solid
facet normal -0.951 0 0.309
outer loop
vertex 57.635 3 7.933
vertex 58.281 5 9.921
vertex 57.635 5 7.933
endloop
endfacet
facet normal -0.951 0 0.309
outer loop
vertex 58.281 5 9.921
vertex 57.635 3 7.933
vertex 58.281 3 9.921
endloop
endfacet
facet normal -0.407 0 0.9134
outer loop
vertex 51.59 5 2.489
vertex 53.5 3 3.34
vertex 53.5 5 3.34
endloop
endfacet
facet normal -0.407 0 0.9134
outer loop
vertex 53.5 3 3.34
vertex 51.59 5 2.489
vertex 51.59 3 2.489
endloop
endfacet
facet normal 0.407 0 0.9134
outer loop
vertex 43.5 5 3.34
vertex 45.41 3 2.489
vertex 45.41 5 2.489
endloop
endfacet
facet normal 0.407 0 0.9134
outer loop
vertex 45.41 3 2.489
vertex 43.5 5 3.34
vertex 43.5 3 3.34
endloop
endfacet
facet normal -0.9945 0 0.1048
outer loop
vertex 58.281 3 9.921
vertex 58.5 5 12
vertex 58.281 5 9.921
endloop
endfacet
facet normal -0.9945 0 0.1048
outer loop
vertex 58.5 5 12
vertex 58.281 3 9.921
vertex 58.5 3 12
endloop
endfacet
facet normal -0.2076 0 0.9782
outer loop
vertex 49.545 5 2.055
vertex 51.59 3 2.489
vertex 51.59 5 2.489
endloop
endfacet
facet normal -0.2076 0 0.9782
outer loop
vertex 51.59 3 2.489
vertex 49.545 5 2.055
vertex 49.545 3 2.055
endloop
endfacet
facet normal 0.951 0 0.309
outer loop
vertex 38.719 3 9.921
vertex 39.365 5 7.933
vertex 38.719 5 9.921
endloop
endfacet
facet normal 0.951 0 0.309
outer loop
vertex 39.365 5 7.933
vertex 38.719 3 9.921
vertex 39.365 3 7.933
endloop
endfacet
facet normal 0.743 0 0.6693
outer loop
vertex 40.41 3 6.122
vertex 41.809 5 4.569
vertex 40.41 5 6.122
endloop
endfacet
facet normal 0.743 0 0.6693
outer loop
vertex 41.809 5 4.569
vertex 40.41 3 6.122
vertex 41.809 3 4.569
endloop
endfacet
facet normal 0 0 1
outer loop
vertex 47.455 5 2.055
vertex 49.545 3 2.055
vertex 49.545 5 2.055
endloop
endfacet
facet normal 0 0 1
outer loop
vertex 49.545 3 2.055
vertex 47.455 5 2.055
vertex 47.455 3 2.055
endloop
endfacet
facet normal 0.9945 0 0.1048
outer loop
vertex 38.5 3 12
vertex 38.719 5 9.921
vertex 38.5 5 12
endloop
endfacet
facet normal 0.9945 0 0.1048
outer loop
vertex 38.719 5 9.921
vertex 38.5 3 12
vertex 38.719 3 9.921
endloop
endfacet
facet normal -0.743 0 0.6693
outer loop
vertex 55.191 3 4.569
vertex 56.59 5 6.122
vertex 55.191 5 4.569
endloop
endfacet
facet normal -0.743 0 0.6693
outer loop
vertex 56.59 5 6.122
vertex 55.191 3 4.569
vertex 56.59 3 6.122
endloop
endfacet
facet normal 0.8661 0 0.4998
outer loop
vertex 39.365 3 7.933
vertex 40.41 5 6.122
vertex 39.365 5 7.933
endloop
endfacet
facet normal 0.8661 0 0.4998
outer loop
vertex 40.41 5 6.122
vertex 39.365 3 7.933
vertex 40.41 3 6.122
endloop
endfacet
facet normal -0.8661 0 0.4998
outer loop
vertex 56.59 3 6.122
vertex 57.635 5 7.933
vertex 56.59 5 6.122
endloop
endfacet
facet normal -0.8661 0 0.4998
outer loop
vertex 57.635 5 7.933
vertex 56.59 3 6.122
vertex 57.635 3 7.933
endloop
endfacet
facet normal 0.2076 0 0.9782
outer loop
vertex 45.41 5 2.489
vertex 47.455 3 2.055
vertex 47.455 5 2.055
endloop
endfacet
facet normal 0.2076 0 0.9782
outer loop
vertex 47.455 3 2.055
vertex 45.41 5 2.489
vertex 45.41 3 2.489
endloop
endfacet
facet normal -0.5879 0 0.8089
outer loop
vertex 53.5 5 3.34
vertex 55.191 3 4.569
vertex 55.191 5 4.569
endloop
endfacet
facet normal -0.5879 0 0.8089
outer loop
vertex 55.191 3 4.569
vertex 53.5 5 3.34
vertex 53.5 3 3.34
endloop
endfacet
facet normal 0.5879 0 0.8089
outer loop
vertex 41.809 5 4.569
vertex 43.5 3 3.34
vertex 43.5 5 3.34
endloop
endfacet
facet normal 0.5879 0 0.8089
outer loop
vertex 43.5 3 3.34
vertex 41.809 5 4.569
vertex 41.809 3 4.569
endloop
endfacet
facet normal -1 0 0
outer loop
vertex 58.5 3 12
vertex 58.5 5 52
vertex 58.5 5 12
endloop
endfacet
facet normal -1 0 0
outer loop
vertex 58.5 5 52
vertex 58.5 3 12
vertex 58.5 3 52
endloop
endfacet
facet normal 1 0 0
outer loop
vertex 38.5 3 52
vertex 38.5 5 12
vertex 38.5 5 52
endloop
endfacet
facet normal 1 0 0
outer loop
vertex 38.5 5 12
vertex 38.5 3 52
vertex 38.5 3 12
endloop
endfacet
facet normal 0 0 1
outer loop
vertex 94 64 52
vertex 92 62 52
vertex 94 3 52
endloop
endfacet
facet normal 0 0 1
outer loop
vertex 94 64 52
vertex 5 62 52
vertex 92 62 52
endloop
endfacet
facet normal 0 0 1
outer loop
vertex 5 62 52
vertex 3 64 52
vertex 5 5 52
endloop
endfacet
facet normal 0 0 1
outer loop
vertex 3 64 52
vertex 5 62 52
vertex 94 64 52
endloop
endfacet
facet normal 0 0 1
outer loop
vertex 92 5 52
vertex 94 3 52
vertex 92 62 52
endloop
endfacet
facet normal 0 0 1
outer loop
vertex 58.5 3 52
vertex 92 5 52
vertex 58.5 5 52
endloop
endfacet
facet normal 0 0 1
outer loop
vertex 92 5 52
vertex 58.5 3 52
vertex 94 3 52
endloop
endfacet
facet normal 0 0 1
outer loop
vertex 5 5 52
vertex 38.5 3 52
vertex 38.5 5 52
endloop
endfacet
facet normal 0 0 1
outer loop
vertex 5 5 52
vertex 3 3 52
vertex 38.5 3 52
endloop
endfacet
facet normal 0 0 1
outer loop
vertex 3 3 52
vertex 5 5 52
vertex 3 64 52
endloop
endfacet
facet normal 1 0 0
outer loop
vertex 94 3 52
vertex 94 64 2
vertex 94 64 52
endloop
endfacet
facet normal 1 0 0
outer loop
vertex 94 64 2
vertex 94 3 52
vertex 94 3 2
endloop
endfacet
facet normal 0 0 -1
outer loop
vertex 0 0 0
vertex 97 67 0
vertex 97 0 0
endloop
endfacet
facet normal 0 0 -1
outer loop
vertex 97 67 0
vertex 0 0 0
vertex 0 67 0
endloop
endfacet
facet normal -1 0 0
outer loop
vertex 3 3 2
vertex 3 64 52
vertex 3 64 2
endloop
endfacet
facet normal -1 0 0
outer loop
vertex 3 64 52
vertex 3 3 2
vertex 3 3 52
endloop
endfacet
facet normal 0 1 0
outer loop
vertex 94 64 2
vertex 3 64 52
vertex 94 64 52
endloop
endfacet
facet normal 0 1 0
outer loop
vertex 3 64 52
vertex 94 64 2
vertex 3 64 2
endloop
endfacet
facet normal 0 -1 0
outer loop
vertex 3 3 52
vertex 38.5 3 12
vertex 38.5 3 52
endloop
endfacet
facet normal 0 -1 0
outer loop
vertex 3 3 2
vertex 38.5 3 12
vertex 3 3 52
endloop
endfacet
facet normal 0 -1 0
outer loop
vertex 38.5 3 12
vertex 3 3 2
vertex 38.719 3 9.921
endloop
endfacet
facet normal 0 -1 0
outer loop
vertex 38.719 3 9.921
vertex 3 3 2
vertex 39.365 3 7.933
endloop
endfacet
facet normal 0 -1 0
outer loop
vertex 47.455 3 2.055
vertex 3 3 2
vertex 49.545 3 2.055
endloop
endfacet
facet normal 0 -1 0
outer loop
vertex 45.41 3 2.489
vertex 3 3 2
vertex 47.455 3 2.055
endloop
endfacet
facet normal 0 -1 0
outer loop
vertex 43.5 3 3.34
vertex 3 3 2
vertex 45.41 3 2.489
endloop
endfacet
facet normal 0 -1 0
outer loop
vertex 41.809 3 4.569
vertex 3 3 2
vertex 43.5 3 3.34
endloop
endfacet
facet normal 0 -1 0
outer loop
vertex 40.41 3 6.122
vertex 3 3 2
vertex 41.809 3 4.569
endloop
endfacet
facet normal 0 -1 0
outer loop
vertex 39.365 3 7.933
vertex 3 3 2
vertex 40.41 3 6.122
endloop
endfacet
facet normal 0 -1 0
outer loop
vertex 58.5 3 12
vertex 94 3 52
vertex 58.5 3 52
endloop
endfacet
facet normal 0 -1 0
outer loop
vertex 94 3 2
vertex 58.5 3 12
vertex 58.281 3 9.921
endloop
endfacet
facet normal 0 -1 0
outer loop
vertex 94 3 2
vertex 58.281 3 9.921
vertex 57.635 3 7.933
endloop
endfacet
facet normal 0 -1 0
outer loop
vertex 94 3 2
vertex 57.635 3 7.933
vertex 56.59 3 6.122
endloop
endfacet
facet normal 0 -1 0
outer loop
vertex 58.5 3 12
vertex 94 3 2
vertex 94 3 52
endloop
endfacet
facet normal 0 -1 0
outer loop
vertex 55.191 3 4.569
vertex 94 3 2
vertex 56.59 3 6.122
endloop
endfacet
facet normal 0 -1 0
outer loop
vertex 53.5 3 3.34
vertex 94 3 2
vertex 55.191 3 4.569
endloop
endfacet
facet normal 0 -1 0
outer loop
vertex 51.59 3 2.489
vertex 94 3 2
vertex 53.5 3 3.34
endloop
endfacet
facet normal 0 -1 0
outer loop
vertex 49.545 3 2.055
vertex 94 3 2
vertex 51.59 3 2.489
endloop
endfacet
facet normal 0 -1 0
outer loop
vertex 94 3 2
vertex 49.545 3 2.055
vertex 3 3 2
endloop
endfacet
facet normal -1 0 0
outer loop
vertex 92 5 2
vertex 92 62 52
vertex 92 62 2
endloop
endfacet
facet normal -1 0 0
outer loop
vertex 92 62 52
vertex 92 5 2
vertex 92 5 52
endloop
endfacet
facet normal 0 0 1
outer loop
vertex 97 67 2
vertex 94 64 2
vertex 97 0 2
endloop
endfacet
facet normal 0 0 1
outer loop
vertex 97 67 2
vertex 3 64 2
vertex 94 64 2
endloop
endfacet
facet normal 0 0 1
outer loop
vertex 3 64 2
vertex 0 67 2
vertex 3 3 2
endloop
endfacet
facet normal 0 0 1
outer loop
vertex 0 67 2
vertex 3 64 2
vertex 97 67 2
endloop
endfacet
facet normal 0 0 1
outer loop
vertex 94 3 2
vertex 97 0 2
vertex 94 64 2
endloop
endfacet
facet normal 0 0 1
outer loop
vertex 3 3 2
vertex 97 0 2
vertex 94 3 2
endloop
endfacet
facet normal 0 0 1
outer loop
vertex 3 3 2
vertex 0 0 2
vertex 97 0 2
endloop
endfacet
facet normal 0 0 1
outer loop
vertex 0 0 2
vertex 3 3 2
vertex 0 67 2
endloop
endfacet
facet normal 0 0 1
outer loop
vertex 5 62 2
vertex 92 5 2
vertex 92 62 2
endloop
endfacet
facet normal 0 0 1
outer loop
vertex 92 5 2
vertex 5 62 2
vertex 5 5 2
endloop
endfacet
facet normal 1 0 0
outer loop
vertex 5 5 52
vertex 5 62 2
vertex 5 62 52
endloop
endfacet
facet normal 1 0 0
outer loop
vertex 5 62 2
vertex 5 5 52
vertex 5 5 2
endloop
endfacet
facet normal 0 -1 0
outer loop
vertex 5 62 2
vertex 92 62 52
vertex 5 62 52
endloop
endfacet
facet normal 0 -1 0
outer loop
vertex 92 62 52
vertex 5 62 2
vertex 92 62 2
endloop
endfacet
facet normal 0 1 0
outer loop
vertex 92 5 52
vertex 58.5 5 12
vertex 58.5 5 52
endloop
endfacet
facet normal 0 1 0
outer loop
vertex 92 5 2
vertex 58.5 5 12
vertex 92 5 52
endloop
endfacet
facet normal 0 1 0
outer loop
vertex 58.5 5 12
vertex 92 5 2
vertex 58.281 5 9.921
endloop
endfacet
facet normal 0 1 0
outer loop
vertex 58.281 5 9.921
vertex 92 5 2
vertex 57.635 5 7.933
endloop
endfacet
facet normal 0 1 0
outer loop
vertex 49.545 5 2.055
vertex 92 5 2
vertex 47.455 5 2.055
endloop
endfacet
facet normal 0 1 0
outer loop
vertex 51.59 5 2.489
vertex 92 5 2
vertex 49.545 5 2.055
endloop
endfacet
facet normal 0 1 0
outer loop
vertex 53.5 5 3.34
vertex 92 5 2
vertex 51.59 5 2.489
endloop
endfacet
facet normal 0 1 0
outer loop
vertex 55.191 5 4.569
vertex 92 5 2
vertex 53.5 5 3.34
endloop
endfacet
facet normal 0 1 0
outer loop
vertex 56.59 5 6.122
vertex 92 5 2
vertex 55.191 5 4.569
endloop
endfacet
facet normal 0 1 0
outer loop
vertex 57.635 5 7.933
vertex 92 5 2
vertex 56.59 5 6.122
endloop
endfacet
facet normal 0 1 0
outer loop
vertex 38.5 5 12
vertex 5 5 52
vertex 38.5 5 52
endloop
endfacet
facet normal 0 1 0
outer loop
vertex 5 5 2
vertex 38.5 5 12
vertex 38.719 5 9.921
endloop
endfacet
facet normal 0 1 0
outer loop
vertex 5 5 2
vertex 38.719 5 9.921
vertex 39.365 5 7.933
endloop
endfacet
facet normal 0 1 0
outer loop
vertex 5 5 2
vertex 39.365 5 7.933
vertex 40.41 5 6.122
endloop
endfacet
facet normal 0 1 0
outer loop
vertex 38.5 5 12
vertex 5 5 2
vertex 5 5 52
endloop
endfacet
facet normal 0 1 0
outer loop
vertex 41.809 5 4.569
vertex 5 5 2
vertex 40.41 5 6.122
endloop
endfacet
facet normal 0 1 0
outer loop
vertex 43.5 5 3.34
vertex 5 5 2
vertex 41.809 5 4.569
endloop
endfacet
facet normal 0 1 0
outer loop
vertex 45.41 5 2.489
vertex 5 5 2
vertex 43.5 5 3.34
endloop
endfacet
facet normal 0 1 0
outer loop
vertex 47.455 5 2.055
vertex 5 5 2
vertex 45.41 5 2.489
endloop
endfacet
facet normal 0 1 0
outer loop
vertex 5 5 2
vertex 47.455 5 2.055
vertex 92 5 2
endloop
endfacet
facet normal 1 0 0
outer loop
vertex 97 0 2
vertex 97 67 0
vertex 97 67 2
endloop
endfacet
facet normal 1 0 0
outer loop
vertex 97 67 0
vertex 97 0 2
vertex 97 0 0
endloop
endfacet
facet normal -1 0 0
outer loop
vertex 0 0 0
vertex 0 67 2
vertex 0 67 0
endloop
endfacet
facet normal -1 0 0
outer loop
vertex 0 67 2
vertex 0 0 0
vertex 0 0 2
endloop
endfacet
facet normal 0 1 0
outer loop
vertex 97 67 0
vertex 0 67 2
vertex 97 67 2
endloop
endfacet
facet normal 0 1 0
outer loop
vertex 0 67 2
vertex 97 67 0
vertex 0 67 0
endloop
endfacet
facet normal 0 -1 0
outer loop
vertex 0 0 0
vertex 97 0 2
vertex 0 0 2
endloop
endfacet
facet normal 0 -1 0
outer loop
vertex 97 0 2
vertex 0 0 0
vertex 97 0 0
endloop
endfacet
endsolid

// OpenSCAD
/**************************************************/
/* Fichier: postItBox.scad                        */
/* Crée par: Rom1 - CANEL - https://www.canel.ch  */
/* Date: 22 juillet 2017                          */
/* Licence: GNU GENERAL PUBLIC LICENSE v3         */
/* Programme: openscad                            */
/* Déscription: Boîte pour ranger des post-it ou  */
/*              ou des cartes de visites.         */
/**************************************************/

/*************/
/* Variables */
/*************/

thickness = 2;				// Épaisseur de la boîte

paper_width = 57;			// Dimension du papier (post-it, cartes, etc)
paper_length = 87;

box_height = 50;			// Hauteur de la boîte

slit = true;				// Prévoir l'ouverture
slit_width = 20;			// Largueur de l'ouverture

base_width = 67;			// Dimension du socle de la boîte
base_length = 97;
base_height = 2;

box_length = paper_length + thickness * 2; 
box_width = paper_width + thickness * 2;


/***********/
/* Modules */
/***********/

// Module dessinant l'ouverture
module slit(){
	translate([0, slit_width/2, 0]) cylinder(d=slit_width, h=thickness*3, center=false);
	translate([-slit_width/2, slit_width/2, 0]) cube([slit_width, box_height-slit_width/2, thickness*3]);
}

// Module dessinant le socle
module base(){
	cube([base_length, base_width, base_height]);
}

// Module dessinant la boîte
module container(){
	difference(){
		cube([box_length, box_width, box_height + thickness]);
		translate([thickness, thickness, thickness]) cube([paper_length, paper_width, box_height]);
		if (slit){
			rotate([90, 0, 0]) translate([(box_length/2), base_height, -(base_width - box_width)/2]) slit();
		}
	}
}


/********/
/* Main */
/********/

base();
translate([(base_length - box_length)/2, (base_width - box_width)/2, 0]) container();
